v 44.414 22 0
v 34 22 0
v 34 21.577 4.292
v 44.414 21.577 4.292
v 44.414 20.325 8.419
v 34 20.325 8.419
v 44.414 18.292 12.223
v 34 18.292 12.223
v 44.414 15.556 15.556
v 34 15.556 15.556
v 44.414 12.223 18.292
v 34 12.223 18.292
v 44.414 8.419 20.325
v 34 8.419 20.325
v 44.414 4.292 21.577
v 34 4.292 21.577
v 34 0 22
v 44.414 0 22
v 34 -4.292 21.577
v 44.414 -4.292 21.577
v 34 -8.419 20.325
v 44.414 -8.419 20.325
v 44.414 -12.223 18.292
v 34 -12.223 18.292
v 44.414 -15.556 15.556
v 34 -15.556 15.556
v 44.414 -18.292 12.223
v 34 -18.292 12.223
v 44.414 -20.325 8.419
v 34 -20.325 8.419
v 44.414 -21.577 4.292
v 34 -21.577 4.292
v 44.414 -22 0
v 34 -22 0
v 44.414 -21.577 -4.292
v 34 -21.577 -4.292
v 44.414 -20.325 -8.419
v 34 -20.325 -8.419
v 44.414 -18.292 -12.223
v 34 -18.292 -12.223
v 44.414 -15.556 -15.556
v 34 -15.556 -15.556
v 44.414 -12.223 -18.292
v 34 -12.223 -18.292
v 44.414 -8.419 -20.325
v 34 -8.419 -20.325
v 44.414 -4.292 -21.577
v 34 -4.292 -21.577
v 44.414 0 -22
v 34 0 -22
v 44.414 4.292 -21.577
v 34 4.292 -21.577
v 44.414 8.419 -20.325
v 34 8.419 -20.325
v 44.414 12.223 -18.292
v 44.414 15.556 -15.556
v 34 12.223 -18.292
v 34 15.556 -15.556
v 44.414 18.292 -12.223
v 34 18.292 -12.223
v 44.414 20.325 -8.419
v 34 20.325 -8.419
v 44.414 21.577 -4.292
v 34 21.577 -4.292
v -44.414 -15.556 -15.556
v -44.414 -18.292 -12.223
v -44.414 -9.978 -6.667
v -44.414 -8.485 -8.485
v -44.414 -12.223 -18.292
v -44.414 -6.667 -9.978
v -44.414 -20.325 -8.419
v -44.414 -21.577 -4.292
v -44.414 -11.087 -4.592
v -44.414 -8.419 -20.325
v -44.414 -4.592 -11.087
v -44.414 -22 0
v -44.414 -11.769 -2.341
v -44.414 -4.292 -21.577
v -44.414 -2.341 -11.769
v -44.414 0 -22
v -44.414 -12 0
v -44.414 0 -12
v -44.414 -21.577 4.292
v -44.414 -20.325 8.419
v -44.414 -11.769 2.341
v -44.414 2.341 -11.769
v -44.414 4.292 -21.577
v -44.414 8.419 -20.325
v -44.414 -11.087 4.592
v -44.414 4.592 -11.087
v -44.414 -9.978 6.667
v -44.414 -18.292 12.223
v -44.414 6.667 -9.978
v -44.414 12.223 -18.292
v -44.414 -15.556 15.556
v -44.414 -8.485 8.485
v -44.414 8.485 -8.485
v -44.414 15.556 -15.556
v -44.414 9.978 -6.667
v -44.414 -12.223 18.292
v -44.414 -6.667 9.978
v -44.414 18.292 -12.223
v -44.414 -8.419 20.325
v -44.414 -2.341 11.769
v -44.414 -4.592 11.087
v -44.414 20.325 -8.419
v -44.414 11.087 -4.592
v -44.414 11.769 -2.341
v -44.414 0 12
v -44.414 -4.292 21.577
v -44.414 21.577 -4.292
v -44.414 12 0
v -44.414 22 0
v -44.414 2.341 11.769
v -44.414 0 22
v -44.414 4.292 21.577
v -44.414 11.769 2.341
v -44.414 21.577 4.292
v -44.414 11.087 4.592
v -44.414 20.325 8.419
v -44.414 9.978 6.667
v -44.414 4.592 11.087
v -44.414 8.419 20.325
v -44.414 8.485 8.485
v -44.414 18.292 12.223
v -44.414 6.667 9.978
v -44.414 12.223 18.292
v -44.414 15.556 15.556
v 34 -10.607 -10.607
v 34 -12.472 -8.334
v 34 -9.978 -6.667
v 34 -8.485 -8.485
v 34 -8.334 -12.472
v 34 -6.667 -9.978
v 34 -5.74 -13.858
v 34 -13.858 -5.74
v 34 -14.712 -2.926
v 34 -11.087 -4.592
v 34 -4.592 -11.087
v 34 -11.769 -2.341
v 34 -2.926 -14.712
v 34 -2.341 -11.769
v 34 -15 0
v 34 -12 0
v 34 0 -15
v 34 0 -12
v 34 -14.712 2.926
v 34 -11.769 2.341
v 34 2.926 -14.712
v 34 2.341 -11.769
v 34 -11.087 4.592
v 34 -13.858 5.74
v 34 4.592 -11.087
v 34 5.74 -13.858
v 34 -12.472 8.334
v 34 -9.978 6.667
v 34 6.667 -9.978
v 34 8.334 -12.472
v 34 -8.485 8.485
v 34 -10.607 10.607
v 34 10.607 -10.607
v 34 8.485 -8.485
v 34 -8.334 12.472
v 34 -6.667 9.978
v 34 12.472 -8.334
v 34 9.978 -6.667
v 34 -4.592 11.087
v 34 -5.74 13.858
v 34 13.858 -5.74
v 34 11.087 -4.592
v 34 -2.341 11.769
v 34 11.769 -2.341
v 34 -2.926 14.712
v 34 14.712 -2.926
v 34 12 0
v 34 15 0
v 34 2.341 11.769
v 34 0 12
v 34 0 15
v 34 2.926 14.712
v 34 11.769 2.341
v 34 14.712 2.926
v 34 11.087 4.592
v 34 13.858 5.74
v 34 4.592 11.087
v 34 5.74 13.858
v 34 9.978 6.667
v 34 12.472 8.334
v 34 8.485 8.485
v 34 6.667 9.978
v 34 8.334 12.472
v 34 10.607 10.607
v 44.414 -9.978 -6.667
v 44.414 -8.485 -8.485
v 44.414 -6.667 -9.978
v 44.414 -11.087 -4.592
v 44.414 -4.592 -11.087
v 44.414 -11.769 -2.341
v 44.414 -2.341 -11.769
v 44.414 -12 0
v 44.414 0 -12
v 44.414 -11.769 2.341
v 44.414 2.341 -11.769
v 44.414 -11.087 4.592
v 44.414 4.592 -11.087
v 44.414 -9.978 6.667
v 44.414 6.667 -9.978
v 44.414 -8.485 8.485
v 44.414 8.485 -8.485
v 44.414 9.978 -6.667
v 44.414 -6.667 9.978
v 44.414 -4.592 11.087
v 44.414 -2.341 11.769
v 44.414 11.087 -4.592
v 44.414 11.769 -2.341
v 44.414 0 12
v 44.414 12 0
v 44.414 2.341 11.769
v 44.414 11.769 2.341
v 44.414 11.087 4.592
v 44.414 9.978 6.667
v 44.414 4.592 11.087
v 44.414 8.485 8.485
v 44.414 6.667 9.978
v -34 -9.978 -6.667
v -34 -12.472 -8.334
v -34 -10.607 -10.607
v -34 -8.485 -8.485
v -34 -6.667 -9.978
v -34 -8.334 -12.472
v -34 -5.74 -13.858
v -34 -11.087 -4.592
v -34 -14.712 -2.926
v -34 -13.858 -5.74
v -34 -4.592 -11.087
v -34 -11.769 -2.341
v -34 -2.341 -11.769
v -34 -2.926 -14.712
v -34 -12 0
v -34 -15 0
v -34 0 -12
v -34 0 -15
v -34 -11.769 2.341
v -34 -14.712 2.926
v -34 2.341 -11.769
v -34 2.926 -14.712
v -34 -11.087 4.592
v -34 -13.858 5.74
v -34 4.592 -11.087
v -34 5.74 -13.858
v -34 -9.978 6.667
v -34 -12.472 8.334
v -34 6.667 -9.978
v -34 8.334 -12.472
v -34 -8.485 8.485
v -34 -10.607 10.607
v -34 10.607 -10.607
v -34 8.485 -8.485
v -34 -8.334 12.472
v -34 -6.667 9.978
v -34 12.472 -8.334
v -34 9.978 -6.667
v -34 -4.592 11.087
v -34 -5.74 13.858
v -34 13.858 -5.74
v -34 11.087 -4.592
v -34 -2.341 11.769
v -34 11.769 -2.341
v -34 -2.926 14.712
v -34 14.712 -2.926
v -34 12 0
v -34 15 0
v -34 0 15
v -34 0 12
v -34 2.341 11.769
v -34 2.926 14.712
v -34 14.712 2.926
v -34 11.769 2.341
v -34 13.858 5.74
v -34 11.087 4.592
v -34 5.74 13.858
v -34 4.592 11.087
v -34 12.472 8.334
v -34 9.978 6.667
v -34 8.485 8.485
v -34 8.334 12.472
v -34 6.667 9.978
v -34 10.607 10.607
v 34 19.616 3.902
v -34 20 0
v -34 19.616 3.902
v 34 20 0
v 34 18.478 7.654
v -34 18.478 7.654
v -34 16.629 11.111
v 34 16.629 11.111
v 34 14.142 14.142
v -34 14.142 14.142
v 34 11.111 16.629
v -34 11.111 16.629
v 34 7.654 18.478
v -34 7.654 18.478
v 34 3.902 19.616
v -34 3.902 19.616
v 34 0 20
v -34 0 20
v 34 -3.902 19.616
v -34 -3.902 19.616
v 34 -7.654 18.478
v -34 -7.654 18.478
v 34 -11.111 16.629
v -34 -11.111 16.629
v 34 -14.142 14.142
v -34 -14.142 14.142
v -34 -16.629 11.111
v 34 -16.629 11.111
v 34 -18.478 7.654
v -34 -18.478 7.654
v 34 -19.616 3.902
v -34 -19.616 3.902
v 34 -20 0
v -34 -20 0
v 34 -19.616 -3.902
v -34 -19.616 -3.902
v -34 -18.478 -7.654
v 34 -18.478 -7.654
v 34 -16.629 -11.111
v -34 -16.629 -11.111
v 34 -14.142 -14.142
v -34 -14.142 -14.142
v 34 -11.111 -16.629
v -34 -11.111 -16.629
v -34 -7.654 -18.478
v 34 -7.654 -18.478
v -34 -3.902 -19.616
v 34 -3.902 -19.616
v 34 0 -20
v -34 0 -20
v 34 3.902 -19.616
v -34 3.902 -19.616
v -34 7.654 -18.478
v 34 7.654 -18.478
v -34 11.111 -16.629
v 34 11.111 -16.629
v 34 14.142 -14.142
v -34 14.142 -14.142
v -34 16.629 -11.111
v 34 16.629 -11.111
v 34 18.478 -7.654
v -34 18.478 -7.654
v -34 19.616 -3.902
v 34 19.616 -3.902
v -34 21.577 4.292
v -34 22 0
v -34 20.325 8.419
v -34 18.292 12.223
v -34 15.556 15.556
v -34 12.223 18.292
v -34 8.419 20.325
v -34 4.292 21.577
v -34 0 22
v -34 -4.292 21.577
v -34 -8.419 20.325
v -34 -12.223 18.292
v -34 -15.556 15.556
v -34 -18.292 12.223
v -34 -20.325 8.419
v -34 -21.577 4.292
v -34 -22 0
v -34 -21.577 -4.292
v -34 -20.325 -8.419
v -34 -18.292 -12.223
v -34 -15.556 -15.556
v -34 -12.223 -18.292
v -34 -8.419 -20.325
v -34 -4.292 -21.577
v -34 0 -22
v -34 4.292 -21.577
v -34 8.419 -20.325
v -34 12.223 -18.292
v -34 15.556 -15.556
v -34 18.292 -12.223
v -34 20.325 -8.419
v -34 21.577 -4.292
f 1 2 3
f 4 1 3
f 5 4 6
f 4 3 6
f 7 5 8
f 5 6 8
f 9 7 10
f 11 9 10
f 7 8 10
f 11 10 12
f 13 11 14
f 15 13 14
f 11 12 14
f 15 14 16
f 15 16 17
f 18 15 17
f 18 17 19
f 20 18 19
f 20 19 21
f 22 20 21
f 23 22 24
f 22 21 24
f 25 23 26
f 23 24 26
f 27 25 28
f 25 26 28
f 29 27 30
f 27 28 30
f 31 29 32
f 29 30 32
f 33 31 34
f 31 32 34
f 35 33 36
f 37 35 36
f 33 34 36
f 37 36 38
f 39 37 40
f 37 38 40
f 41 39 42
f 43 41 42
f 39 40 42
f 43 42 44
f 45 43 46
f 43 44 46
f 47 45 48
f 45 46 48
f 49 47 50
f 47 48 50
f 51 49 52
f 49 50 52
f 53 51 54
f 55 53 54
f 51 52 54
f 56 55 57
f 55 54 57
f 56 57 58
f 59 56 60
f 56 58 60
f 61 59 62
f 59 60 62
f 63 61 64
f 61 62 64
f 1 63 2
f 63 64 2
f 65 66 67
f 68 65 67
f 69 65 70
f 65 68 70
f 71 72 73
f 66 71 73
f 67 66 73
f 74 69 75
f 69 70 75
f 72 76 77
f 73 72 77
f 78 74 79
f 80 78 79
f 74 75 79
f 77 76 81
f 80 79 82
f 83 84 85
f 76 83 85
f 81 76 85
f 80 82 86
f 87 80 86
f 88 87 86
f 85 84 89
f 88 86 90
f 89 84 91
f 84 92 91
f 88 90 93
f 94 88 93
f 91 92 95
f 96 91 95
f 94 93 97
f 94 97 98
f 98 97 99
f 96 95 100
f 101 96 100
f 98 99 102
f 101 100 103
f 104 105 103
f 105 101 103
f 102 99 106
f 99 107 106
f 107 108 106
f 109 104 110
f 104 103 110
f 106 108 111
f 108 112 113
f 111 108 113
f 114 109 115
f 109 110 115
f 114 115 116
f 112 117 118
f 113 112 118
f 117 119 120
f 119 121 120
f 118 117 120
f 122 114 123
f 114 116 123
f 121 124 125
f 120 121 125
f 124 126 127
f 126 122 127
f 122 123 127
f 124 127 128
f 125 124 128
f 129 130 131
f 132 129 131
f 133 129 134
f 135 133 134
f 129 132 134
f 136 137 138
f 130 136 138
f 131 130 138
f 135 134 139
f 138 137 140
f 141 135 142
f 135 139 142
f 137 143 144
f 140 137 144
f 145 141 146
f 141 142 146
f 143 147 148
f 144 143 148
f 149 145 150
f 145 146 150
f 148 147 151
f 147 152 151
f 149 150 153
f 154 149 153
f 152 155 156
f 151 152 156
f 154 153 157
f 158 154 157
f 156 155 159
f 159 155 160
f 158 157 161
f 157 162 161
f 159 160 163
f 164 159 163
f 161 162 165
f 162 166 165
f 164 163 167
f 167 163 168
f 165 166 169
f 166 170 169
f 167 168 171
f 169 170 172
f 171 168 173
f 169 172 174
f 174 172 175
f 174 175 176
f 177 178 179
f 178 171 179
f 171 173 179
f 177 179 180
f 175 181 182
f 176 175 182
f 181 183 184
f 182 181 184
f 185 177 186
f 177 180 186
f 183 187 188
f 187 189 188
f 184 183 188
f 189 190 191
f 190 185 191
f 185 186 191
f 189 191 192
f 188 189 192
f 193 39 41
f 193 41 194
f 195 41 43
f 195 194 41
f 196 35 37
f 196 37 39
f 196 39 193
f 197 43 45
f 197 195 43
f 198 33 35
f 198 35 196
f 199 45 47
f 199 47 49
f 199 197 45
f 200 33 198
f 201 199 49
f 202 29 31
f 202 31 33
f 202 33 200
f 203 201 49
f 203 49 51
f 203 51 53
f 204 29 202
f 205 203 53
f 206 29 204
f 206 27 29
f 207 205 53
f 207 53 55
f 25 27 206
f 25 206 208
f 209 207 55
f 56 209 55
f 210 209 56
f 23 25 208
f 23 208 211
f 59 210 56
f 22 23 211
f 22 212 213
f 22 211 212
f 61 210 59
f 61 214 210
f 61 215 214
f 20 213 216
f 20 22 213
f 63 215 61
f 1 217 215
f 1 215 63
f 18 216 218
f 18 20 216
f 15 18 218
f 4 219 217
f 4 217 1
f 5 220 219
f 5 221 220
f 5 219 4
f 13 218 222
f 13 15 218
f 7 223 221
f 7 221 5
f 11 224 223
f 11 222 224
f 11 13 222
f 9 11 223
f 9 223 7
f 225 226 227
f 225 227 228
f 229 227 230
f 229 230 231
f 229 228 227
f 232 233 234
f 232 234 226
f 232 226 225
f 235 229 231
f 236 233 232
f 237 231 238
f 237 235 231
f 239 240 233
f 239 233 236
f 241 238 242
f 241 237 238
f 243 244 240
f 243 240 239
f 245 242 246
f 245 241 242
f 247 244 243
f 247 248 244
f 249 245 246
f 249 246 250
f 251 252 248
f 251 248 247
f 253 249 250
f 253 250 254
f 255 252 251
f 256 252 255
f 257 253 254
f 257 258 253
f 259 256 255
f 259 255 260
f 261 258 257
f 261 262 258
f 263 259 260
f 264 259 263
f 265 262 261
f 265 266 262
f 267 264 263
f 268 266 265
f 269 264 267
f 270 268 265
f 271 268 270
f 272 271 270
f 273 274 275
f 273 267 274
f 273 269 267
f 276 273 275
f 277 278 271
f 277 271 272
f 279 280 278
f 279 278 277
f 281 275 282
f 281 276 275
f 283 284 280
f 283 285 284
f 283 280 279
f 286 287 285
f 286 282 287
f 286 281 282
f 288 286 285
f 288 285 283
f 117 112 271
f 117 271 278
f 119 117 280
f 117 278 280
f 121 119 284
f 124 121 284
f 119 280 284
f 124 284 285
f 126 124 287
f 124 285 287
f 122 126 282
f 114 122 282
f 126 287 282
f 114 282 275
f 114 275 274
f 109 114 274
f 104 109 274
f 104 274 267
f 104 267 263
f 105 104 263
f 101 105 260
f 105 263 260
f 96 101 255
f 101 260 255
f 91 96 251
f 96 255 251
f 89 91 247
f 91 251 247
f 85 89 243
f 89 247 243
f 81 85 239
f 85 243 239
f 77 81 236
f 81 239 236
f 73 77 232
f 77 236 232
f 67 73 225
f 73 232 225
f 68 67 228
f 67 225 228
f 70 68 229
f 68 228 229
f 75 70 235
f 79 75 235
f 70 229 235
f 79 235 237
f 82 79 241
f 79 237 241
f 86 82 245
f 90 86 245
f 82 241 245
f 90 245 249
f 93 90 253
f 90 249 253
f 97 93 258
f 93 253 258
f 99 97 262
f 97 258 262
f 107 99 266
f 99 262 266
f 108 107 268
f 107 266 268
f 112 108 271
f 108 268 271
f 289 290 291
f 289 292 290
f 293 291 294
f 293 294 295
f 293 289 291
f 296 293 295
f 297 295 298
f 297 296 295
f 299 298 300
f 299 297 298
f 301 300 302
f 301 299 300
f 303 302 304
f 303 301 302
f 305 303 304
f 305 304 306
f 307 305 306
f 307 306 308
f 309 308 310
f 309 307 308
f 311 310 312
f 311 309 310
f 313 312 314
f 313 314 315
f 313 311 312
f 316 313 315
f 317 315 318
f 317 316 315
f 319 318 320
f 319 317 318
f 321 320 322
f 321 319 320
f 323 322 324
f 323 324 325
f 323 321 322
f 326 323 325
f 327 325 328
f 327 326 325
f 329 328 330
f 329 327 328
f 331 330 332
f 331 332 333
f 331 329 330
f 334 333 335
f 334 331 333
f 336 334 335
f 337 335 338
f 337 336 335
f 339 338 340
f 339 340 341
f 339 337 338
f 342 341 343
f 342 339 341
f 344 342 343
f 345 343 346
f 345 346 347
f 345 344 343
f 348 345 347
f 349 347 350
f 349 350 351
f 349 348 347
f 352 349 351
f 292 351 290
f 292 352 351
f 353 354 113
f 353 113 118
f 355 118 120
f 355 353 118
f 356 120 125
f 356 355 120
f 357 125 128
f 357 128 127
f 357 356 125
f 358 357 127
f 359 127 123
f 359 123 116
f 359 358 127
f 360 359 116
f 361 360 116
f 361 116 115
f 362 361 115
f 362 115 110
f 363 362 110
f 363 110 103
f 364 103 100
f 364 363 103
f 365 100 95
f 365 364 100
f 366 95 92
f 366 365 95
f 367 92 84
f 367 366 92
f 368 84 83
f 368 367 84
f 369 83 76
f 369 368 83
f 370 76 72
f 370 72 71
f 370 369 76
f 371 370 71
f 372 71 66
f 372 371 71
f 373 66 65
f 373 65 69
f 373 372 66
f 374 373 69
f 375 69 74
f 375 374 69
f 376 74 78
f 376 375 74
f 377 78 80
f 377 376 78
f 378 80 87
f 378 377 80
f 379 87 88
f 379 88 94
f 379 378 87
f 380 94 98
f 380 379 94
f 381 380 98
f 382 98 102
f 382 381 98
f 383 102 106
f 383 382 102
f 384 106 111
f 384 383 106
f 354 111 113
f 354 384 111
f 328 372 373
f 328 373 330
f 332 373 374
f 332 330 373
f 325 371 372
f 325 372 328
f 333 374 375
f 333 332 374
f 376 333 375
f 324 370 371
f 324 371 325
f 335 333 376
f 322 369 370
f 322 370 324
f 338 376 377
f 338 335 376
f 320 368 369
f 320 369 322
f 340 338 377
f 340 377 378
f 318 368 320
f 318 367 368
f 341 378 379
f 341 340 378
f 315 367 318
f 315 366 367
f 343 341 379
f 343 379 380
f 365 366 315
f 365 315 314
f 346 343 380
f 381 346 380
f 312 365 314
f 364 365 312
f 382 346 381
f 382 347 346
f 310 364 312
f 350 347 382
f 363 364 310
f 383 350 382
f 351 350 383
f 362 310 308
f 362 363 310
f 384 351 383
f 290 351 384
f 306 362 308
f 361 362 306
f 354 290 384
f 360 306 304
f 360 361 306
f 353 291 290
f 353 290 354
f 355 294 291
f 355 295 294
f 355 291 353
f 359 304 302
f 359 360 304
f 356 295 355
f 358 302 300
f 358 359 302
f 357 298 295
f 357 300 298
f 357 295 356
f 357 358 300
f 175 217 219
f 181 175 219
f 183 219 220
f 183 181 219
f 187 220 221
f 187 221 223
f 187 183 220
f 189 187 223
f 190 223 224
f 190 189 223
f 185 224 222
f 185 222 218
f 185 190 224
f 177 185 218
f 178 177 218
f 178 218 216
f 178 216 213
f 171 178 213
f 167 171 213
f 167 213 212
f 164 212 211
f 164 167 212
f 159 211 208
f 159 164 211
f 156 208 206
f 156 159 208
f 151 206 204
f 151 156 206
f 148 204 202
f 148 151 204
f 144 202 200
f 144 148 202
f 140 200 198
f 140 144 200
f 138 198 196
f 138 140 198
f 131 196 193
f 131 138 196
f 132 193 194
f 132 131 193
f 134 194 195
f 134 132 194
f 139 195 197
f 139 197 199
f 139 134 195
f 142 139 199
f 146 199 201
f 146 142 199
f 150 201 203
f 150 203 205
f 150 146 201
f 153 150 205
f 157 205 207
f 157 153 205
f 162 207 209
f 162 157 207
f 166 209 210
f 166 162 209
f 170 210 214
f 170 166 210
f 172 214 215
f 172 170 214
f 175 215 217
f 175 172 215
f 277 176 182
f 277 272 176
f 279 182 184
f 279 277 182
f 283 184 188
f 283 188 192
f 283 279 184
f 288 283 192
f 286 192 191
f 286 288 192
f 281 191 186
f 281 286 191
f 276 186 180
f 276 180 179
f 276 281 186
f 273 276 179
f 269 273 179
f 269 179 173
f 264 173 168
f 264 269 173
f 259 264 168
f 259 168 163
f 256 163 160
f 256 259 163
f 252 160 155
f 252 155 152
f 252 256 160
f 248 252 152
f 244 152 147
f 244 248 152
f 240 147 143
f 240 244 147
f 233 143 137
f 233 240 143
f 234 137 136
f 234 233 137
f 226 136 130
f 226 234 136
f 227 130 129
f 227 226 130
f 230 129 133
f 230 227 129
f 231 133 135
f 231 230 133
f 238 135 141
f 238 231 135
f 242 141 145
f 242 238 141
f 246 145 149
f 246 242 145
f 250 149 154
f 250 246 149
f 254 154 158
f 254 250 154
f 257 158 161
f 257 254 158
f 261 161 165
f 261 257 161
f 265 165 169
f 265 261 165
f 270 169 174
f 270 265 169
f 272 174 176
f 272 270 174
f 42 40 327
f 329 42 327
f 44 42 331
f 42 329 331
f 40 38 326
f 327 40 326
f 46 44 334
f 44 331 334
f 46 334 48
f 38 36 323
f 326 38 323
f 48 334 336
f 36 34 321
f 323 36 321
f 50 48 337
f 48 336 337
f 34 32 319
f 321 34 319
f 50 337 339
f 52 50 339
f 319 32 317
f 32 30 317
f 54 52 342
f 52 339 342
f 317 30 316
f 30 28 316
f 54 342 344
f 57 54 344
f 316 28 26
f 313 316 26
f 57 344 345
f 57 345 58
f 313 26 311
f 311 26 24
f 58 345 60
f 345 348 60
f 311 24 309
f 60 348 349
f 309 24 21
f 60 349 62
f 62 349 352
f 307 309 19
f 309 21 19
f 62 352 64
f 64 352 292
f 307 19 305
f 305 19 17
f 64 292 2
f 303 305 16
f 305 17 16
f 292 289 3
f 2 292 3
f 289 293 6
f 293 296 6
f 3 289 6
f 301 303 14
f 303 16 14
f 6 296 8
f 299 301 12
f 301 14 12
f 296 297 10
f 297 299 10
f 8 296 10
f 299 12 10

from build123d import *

# Parameters (mm, degrees)
F0_R     = 20
F0_R_2   = 15
F1_DEPTH = 34
F2_R     = 22
F2_R_2   = 12
F3_DEPTH = 10.414


# Not quite as in the source:
# - a pattern or mirror of a feature is missing from the dataset's text; its kind, count and spacing are read off the source's solid


with BuildPart() as f1:
    # F0 (on Right) → F1 (new body, symmetric)
    with BuildSketch(Plane.YZ):
        Circle(F0_R)
        Circle(F0_R_2, mode=Mode.SUBTRACT)
    extrude(amount=F1_DEPTH, both=True)

    # F2 (on face) → F3 (join)
    with BuildSketch(Plane.YZ.offset(34)):
        Circle(F2_R)
        Circle(F2_R_2, mode=Mode.SUBTRACT)
    f3 = extrude(amount=F3_DEPTH)

    # F3_copies: F3 across plane
    add(f3.mirror(Plane(origin=(0, 0, 0), x_dir=(0, 0, -1), z_dir=(-1, 0, 0))))


solid = f1.part
